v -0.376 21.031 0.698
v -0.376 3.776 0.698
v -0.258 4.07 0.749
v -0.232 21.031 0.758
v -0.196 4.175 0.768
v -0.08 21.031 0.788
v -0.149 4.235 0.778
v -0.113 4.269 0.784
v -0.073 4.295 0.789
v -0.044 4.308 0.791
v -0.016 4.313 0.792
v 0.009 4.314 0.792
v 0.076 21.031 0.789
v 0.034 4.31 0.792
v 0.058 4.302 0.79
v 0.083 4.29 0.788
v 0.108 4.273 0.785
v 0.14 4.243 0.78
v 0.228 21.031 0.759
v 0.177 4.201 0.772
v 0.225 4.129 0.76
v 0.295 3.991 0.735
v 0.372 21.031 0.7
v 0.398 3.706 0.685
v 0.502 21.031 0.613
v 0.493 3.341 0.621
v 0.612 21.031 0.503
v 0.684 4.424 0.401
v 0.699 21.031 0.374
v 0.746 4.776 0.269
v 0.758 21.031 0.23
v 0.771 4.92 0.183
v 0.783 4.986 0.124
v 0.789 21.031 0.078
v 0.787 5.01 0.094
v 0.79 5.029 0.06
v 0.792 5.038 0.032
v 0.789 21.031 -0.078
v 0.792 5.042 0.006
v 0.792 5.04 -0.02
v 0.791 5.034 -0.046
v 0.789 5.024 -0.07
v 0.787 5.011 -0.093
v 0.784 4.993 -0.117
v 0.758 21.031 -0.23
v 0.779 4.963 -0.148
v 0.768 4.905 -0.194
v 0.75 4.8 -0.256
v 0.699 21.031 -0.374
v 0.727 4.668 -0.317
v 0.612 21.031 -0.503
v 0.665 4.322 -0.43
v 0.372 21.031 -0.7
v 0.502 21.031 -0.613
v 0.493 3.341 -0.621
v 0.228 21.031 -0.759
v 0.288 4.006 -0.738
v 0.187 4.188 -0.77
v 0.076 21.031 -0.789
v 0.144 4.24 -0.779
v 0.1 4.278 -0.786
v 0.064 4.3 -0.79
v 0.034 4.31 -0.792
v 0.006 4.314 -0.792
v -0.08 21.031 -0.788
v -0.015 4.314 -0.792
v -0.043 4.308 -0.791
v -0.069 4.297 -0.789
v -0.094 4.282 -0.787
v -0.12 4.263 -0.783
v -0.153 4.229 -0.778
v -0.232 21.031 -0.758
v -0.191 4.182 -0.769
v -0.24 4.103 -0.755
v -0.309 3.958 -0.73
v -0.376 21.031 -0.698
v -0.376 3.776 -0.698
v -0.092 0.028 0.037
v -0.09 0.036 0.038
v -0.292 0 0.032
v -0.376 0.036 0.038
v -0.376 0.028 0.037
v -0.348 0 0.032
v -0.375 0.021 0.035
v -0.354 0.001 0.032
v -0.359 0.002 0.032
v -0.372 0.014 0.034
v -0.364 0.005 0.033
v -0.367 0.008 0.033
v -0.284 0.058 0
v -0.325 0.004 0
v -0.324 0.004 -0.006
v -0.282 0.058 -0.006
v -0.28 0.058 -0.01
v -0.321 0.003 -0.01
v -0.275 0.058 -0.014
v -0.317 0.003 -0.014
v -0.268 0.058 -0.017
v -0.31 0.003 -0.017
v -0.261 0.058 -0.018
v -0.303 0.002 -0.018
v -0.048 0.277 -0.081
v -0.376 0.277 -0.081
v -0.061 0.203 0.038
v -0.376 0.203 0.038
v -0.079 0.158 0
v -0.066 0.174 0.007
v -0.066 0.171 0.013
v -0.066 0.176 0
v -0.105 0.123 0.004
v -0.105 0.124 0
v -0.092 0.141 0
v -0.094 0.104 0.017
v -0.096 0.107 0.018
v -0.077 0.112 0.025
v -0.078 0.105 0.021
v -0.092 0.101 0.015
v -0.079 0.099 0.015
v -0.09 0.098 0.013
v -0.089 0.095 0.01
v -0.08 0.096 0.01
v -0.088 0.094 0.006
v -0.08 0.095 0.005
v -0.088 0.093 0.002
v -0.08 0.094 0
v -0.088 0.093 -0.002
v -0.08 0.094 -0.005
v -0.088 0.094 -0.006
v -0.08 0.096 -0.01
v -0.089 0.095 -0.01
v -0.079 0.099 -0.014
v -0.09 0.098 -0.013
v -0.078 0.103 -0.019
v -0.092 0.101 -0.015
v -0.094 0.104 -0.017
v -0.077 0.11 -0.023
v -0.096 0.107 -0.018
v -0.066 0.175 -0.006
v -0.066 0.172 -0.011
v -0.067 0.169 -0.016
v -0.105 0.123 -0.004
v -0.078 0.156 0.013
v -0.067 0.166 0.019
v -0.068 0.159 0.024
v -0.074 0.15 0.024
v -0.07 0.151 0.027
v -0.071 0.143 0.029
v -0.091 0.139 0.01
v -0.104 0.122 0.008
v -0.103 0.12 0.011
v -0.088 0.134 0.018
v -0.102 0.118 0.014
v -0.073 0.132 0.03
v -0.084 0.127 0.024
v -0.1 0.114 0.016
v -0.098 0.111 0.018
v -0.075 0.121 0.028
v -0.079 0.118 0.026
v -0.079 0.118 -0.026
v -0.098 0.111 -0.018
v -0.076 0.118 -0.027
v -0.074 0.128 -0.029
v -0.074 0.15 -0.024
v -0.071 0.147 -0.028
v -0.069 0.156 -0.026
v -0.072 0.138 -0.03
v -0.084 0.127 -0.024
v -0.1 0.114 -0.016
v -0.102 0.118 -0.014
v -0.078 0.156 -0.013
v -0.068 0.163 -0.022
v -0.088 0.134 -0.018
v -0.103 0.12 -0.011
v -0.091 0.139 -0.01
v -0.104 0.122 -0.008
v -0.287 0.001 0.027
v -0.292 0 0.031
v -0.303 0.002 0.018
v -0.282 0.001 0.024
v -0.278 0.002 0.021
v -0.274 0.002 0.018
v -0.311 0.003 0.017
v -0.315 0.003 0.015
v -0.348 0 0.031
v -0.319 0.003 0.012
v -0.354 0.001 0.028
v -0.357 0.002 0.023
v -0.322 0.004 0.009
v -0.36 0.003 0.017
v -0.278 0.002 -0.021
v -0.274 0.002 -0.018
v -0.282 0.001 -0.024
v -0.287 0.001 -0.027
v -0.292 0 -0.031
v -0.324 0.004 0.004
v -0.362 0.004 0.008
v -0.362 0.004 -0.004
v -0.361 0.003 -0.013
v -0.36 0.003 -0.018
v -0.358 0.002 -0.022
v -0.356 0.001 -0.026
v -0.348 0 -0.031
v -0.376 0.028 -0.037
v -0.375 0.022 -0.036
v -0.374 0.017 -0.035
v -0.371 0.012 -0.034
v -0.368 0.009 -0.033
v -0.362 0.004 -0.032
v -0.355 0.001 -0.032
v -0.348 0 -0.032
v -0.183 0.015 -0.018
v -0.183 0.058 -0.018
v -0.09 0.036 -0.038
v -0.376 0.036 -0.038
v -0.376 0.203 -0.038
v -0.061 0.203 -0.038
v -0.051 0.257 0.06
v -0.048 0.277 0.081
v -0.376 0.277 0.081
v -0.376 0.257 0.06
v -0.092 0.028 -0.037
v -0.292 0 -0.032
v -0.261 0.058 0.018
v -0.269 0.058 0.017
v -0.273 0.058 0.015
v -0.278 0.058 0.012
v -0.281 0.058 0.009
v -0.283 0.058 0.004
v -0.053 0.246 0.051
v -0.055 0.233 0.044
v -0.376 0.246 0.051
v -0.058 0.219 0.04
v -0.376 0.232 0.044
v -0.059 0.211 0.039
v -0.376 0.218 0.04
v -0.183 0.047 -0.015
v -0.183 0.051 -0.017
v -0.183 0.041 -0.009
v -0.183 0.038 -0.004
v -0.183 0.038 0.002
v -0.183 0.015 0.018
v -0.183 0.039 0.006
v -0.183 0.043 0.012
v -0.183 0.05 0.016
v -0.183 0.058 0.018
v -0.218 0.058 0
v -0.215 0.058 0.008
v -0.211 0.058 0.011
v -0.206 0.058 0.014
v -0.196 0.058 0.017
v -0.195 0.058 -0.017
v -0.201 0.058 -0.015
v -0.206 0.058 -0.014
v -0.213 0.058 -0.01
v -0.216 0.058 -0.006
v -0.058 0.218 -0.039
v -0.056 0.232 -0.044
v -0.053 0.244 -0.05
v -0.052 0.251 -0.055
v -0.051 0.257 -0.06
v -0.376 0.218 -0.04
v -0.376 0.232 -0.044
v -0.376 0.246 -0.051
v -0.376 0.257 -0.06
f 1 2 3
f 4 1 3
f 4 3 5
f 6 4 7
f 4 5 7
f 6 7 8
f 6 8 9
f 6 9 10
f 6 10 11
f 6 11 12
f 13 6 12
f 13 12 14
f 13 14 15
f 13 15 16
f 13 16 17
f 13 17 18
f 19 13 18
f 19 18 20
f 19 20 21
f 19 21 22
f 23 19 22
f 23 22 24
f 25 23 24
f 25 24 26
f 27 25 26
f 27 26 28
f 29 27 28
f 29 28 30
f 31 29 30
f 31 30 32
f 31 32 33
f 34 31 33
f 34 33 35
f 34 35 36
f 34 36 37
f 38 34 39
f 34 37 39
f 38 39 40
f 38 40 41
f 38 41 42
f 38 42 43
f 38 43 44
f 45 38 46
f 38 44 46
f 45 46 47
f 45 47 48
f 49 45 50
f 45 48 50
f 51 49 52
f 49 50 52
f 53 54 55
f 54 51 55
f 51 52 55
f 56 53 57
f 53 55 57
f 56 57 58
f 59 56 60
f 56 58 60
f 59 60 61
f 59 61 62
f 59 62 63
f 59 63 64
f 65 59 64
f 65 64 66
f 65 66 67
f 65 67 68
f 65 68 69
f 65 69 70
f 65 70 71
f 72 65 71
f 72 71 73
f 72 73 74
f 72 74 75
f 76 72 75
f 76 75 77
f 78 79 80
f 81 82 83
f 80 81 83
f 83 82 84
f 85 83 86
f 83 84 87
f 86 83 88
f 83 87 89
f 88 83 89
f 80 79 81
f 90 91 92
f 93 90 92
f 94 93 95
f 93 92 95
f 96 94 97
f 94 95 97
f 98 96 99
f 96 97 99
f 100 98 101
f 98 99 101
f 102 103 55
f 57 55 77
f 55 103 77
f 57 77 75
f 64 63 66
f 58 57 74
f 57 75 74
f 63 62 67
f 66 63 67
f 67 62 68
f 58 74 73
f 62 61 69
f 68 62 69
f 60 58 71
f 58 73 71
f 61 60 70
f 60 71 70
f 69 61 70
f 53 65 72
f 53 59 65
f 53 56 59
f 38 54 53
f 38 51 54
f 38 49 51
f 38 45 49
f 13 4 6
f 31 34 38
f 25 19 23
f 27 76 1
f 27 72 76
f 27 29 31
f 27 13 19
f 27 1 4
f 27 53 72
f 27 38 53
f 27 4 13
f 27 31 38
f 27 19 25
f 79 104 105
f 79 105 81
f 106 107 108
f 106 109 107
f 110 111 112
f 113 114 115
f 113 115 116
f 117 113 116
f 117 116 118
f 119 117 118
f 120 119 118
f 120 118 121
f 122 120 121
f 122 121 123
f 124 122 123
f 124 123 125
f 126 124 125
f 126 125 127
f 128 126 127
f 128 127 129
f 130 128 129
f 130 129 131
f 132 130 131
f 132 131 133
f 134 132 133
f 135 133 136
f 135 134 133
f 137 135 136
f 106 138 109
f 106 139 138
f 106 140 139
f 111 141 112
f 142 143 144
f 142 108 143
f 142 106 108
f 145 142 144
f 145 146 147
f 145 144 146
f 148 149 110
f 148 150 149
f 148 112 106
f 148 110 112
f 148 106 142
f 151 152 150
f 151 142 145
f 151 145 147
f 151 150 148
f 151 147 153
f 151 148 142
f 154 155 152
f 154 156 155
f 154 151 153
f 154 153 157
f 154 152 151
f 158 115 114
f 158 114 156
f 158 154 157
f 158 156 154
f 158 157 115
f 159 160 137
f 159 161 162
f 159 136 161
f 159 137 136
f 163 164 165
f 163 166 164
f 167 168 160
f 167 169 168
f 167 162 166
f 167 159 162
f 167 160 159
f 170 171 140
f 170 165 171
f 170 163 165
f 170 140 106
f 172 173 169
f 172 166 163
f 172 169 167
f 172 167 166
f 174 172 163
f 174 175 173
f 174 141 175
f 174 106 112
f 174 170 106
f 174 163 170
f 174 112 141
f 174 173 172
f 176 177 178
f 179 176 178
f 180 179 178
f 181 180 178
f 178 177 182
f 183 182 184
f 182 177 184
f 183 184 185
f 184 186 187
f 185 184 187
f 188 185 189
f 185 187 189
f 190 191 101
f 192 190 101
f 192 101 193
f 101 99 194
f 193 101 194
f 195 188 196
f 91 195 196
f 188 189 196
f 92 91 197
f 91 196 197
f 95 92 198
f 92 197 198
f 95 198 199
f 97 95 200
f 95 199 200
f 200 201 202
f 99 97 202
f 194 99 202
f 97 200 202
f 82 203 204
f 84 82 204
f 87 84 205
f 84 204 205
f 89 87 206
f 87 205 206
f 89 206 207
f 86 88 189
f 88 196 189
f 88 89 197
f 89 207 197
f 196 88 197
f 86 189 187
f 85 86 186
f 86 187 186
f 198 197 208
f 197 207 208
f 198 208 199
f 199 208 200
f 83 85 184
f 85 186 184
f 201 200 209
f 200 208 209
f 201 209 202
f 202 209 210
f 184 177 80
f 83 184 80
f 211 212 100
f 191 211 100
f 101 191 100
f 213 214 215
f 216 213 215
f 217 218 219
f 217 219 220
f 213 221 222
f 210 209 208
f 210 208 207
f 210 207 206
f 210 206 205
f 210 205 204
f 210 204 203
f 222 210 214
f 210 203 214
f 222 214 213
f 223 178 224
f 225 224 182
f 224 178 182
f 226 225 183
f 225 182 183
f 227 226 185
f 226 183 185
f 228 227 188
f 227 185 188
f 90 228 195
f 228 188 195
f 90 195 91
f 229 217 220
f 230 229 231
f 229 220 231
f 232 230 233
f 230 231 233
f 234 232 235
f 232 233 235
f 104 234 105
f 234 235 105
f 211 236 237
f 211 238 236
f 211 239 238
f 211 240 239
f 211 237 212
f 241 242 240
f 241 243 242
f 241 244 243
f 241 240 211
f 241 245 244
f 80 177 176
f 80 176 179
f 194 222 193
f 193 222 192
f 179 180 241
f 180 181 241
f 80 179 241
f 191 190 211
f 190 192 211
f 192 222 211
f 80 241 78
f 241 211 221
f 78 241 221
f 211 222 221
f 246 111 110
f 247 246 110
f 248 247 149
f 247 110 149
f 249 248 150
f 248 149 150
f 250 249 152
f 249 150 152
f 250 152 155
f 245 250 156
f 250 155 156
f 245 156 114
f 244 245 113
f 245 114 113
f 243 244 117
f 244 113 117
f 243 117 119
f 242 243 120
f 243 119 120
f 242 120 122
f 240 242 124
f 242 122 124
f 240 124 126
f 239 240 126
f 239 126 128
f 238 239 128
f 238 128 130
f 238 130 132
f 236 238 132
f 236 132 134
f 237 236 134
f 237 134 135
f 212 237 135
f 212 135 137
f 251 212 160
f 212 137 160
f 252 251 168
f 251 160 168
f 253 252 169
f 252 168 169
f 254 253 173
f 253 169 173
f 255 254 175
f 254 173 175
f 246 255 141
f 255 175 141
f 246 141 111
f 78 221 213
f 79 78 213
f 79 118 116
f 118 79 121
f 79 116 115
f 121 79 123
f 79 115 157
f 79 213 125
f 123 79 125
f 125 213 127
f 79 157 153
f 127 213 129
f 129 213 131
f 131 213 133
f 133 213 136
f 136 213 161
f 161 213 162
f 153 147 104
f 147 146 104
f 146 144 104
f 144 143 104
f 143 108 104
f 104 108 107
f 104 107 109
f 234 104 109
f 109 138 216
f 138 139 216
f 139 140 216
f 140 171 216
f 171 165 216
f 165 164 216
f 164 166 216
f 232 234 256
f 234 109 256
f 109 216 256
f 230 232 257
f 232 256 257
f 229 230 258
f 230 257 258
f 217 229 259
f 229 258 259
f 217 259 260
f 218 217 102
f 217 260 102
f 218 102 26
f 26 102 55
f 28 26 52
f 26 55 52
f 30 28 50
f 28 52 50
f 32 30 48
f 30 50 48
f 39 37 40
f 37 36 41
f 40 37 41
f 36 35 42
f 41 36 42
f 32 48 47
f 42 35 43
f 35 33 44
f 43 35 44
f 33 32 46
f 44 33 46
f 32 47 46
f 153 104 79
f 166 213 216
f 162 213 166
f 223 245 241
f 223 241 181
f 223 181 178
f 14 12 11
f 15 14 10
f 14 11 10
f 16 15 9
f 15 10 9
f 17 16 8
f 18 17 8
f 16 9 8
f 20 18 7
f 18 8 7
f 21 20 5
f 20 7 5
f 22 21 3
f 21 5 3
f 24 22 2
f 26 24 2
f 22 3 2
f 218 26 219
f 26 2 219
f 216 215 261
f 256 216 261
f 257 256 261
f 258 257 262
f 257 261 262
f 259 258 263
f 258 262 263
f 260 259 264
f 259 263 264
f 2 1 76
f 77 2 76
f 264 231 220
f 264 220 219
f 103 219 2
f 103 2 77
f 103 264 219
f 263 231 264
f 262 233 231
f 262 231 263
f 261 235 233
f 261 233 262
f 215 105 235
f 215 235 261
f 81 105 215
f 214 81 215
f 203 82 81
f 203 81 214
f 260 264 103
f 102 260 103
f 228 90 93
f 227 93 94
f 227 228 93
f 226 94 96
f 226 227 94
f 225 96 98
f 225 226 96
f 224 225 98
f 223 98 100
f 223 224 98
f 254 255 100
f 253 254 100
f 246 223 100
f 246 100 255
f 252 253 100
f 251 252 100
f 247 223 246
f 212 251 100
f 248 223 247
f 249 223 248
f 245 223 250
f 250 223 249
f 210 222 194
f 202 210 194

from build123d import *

# Parameters (mm, degrees)
TD_SKETCH_R                             = 0.79248
TL_FEATURE_DEPTH                        = 21.0312
TDF_STD_SKETCH_W                        = 2.09296
TDF_STD_SKETCH_H                        = 2.09296
TDF_STD_FEATURE_DEPTH                   = 22.061040395
ISA_20_STD_FEATURE_DEPTH                = 22.061040395
ISA_20_STD_FEATURE_DEPTH_BACK           = 22.061040395
VW_STD_FEATURE_DEPTH                    = 22.061040395
VW_STD_FEATURE_DEPTH_BACK               = 22.061040395
F_10BA_STD_FEATURE_DEPTH                = 22.061040503
F_10BA_STD_FEATURE_DEPTH_BACK           = 22.061040503
FRO_STD_FEATURE_DEPTH                   = 22.061040395
FRO_STD_FEATURE_DEPTH_BACK              = 22.061040395
C_STD_FEATURE_DEPTH                     = 22.061040395
C_STD_FEATURE_DEPTH_BACK                = 22.061040395
ERW_STD_FEATURE_DEPTH                   = 0.018159984
H_STD_FEATURE_REACH                     = 22.957
H_STD_SKETCH_R                          = 0.01778
H_STD_SKETCH_3_R                        = 0.01778
FUNNEL_FINAL_DIAMETRE_STD_FEATURE_DEPTH = 2.499995
FUNNEL_FINAL_DIAMETRE_STD_FEATURE_DRAFT = -22.5
ROUND_BR_STD_FEATURE_START              = -1
ROUND_BR_STD_FEATURE_DEPTH              = 0.936596355


with BuildPart() as part:
    # TD_sketch → TL_feature (new body)
    with BuildSketch(Plane(origin=(0, 0, 0), x_dir=(1, 0, 0), z_dir=(0, 1, 0))):
        with Locations(Location((0, 0, 0), (0, 0, 270))):
            Circle(TD_SKETCH_R)
    extrude(amount=TL_FEATURE_DEPTH)

    # TDF_STD_sketch → TDF_STD_feature (cut, through all)
    with BuildSketch(Plane(origin=(0, 0, 0), x_dir=(1, 0, 0), z_dir=(0, 1, 0))):
        with Locations((-1.4224, 0)):
            Rectangle(TDF_STD_SKETCH_W, TDF_STD_SKETCH_H)
    extrude(amount=TDF_STD_FEATURE_DEPTH, mode=Mode.SUBTRACT)

    # ISA_20_STD_sketch → ISA_20_STD_feature (cut, two sides: drawn at the far end of the back side and taken through both)
    with BuildSketch(Plane(origin=(0, 0, 0), x_dir=(0, 0, -1), z_dir=(1, 0, 0)).offset(-ISA_20_STD_FEATURE_DEPTH_BACK)):
        Polygon((-12.948362797, 73.253751326), (-3.740117997, 21.0312), (-0.03175, 0), (0.03175, 0), (3.740117997, 21.0312), (12.948362797, 73.253751326), (12.948362797, -32.802585388), (-12.948362797, -32.802585388), align=None)
    extrude(amount=ISA_20_STD_FEATURE_DEPTH + ISA_20_STD_FEATURE_DEPTH_BACK, mode=Mode.SUBTRACT)

    # VW_STD_sketch → VW_STD_feature (cut, two sides: drawn at the far end of the back side and taken through both)
    with BuildSketch(Plane(origin=(0, 0, 0), x_dir=(0, 0, -1), z_dir=(1, 0, 0)).offset(-VW_STD_FEATURE_DEPTH_BACK)):
        with BuildLine():
            Line((-70.567982417, 70.76464549), (-20.834536927, 21.0312))
            Line((-20.834536927, 21.0312), (-0.060418463, 0.257081537))
            ThreePointArc((-0.060418463, 0.257081537), (-0.04390038, 0.232360478), (-0.0381, 0.2032))
            Line((-0.0381, 0.2032), (-0.0381, 0))
            Line((-0.0381, 0), (0.0381, 0))
            Line((0.0381, 0), (0.0381, 0.2032))
            ThreePointArc((0.0381, 0.2032), (0.04390038, 0.232360478), (0.060418463, 0.257081537))
            Line((0.060418463, 0.257081537), (20.834536927, 21.0312))
            Line((20.834536927, 21.0312), (70.567982417, 70.76464549))
            Line((70.567982417, 70.76464549), (70.567982417, -69.902780741))
            Line((70.567982417, -69.902780741), (-70.567982417, -69.902780741))
            Line((-70.567982417, -69.902780741), (-70.567982417, 70.76464549))
        make_face()
    extrude(amount=VW_STD_FEATURE_DEPTH + VW_STD_FEATURE_DEPTH_BACK, mode=Mode.SUBTRACT)

    # 10BA_STD_sketch → 10BA_STD_feature (cut, two sides: drawn at the far end of the back side and taken through both)
    with BuildSketch(Plane.XY.offset(-F_10BA_STD_FEATURE_DEPTH_BACK)):
        Polygon((-53.187772193, 0), (-0.37592, 0), (-0.2921, 0), (-0.091550146, 0.028185444), (3.611847997, 21.0312), (12.782529889, 73.04072149), (91.167207648, 2.243763782), (25.196905566, -70.796957708), align=None)
    extrude(amount=F_10BA_STD_FEATURE_DEPTH + F_10BA_STD_FEATURE_DEPTH_BACK, mode=Mode.SUBTRACT)

    # FRO_STD_sketch → FRO_STD_feature (cut, two sides: drawn at the far end of the back side and taken through both)
    with BuildSketch(Plane.XY.offset(-FRO_STD_FEATURE_DEPTH_BACK)):
        with BuildLine():
            Line((-0.37592, 52.152138388), (-0.37592, 0.02794))
            ThreePointArc((-0.37592, 0.02794), (-0.367736563, 0.008183437), (-0.34798, 0))
            Line((-0.34798, 0), (51.776218388, 0))
            Line((51.776218388, 0), (-21.9385299, -73.714748288))
            Line((-21.9385299, -73.714748288), (-74.090668288, -21.5626099))
            Line((-74.090668288, -21.5626099), (-0.37592, 52.152138388))
        make_face()
    extrude(amount=FRO_STD_FEATURE_DEPTH + FRO_STD_FEATURE_DEPTH_BACK, mode=Mode.SUBTRACT)

    # C_STD_sketch → C_STD_feature (cut, two sides: drawn at the far end of the back side and taken through both)
    with BuildSketch(Plane(origin=(0, 0, 0), x_dir=(0, 0, -1), z_dir=(1, 0, 0)).offset(-C_STD_FEATURE_DEPTH_BACK)):
        with BuildLine():
            Line((-50.530423385, -12.791040855), (-0.030559272, 0))
            ThreePointArc((-0.030559272, 0), (0, 0.00381), (0.030559272, 0))
            Line((0.030559272, 0), (50.530423385, -12.791040855))
            Line((50.530423385, -12.791040855), (50.530423385, -116.980234183))
            Line((50.530423385, -116.980234183), (-50.530423385, -116.980234183))
            Line((-50.530423385, -116.980234183), (-50.530423385, -12.791040855))
        make_face()
    extrude(amount=C_STD_FEATURE_DEPTH + C_STD_FEATURE_DEPTH_BACK, mode=Mode.SUBTRACT)


with BuildPart() as body_2:
    # ERW_STD_sketch → ERW_STD_feature (new, symmetric)
    with BuildSketch(Plane.XY):
        Polygon((-0.18288, 0.05842), (-0.18288, 0), (-0.32766, 0), (-0.283637372, 0.05842), align=None)
    extrude(amount=ERW_STD_FEATURE_DEPTH, both=True)

    # H_STD_sketch → H_STD_feature (add, up to next)
    with BuildSketch(Plane(origin=(-0.096399563, 0.108349503, 0), x_dir=(0, 0, -1), z_dir=(0.8660254037844415, 0.4999999999999953, 0)), mode=Mode.PRIVATE) as h_std_feature_sk1:
        with Locations(Location((0, 0, 0), (0, 0, 90))):
            Circle(H_STD_SKETCH_R)
    h_std_feature_tool1 = extrude(h_std_feature_sk1.sketch, amount=-H_STD_FEATURE_REACH, mode=Mode.PRIVATE) - body_2.part
    add(h_std_feature_tool1.solids().sort_by_distance((-0.0964, 0.10835, 0))[0])


with BuildPart() as funnel_final_diametre_std_feature_tool:
    # H_STD_sketch<3> → funnel_final_diametre_STD_feature (with draft: the straight prism first)
    with BuildSketch(Plane(origin=(-0.096399563, 0.108349503, 0), x_dir=(0, 0, -1), z_dir=(0.8660254037844415, 0.4999999999999953, 0))):
        with Locations(Location((0, 0, 0), (0, 0, 90))):
            Circle(H_STD_SKETCH_3_R)
    extrude(amount=FUNNEL_FINAL_DIAMETRE_STD_FEATURE_DEPTH)
    # funnel_final_diametre_STD_feature: the draft: its side faces are tilted about the plane it starts from
    funnel_final_diametre_std_feature_sides = [funnel_final_diametre_std_feature_tool.faces().sort_by_distance(p)[0] for p in [
        (0.995020026, 0.717950322, 0),
    ]]
    draft(funnel_final_diametre_std_feature_sides, Plane(origin=(-0.096399563, 0.108349503, 0), x_dir=(0, 0, -1), z_dir=(0.8660254037844415, 0.4999999999999953, 0)), FUNNEL_FINAL_DIAMETRE_STD_FEATURE_DRAFT)


with BuildPart() as body_2_1:
    add(body_2.part)

    # funnel_final_diametre_STD_feature: add funnel_final_diametre_std_feature_tool
    add(funnel_final_diametre_std_feature_tool.part)

    # ROUND_BR_STD_feature: read off the stored shape, not the designer's step
    # ROUND_BR_STD_feature outline → ROUND_BR_STD_feature (cut)
    with BuildSketch(Plane(origin=(0, 0, 0), x_dir=(0.79863551004729, -0.601815023152052, 0), z_dir=(0.601815023152052, 0.79863551004729, 0)).offset(ROUND_BR_STD_FEATURE_START)):
        with BuildLine():
            Line((-0.261680911, -0.018159984), (-0.243520927, -0.018159984))
            ThreePointArc((-0.243520927, -0.018159984), (-0.256361975, -0.012841048), (-0.261680911, 0))
            Line((-0.261680911, 0), (-0.261680911, -0.018159984))
        make_face()
        with BuildLine():
            Line((-0.261680911, 0.018159984), (-0.261680911, 0))
            ThreePointArc((-0.261680911, 0), (-0.256361975, 0.012841048), (-0.243520927, 0.018159984))
            Line((-0.243520927, 0.018159984), (-0.261680911, 0.018159984))
        make_face()
    extrude(amount=ROUND_BR_STD_FEATURE_DEPTH, mode=Mode.SUBTRACT)


with BuildPart() as part_1:
    add(part.part)

    # COMBINE_STD_feature: cut body 2
    add(body_2_1.part, mode=Mode.SUBTRACT)


solid = part_1.part
